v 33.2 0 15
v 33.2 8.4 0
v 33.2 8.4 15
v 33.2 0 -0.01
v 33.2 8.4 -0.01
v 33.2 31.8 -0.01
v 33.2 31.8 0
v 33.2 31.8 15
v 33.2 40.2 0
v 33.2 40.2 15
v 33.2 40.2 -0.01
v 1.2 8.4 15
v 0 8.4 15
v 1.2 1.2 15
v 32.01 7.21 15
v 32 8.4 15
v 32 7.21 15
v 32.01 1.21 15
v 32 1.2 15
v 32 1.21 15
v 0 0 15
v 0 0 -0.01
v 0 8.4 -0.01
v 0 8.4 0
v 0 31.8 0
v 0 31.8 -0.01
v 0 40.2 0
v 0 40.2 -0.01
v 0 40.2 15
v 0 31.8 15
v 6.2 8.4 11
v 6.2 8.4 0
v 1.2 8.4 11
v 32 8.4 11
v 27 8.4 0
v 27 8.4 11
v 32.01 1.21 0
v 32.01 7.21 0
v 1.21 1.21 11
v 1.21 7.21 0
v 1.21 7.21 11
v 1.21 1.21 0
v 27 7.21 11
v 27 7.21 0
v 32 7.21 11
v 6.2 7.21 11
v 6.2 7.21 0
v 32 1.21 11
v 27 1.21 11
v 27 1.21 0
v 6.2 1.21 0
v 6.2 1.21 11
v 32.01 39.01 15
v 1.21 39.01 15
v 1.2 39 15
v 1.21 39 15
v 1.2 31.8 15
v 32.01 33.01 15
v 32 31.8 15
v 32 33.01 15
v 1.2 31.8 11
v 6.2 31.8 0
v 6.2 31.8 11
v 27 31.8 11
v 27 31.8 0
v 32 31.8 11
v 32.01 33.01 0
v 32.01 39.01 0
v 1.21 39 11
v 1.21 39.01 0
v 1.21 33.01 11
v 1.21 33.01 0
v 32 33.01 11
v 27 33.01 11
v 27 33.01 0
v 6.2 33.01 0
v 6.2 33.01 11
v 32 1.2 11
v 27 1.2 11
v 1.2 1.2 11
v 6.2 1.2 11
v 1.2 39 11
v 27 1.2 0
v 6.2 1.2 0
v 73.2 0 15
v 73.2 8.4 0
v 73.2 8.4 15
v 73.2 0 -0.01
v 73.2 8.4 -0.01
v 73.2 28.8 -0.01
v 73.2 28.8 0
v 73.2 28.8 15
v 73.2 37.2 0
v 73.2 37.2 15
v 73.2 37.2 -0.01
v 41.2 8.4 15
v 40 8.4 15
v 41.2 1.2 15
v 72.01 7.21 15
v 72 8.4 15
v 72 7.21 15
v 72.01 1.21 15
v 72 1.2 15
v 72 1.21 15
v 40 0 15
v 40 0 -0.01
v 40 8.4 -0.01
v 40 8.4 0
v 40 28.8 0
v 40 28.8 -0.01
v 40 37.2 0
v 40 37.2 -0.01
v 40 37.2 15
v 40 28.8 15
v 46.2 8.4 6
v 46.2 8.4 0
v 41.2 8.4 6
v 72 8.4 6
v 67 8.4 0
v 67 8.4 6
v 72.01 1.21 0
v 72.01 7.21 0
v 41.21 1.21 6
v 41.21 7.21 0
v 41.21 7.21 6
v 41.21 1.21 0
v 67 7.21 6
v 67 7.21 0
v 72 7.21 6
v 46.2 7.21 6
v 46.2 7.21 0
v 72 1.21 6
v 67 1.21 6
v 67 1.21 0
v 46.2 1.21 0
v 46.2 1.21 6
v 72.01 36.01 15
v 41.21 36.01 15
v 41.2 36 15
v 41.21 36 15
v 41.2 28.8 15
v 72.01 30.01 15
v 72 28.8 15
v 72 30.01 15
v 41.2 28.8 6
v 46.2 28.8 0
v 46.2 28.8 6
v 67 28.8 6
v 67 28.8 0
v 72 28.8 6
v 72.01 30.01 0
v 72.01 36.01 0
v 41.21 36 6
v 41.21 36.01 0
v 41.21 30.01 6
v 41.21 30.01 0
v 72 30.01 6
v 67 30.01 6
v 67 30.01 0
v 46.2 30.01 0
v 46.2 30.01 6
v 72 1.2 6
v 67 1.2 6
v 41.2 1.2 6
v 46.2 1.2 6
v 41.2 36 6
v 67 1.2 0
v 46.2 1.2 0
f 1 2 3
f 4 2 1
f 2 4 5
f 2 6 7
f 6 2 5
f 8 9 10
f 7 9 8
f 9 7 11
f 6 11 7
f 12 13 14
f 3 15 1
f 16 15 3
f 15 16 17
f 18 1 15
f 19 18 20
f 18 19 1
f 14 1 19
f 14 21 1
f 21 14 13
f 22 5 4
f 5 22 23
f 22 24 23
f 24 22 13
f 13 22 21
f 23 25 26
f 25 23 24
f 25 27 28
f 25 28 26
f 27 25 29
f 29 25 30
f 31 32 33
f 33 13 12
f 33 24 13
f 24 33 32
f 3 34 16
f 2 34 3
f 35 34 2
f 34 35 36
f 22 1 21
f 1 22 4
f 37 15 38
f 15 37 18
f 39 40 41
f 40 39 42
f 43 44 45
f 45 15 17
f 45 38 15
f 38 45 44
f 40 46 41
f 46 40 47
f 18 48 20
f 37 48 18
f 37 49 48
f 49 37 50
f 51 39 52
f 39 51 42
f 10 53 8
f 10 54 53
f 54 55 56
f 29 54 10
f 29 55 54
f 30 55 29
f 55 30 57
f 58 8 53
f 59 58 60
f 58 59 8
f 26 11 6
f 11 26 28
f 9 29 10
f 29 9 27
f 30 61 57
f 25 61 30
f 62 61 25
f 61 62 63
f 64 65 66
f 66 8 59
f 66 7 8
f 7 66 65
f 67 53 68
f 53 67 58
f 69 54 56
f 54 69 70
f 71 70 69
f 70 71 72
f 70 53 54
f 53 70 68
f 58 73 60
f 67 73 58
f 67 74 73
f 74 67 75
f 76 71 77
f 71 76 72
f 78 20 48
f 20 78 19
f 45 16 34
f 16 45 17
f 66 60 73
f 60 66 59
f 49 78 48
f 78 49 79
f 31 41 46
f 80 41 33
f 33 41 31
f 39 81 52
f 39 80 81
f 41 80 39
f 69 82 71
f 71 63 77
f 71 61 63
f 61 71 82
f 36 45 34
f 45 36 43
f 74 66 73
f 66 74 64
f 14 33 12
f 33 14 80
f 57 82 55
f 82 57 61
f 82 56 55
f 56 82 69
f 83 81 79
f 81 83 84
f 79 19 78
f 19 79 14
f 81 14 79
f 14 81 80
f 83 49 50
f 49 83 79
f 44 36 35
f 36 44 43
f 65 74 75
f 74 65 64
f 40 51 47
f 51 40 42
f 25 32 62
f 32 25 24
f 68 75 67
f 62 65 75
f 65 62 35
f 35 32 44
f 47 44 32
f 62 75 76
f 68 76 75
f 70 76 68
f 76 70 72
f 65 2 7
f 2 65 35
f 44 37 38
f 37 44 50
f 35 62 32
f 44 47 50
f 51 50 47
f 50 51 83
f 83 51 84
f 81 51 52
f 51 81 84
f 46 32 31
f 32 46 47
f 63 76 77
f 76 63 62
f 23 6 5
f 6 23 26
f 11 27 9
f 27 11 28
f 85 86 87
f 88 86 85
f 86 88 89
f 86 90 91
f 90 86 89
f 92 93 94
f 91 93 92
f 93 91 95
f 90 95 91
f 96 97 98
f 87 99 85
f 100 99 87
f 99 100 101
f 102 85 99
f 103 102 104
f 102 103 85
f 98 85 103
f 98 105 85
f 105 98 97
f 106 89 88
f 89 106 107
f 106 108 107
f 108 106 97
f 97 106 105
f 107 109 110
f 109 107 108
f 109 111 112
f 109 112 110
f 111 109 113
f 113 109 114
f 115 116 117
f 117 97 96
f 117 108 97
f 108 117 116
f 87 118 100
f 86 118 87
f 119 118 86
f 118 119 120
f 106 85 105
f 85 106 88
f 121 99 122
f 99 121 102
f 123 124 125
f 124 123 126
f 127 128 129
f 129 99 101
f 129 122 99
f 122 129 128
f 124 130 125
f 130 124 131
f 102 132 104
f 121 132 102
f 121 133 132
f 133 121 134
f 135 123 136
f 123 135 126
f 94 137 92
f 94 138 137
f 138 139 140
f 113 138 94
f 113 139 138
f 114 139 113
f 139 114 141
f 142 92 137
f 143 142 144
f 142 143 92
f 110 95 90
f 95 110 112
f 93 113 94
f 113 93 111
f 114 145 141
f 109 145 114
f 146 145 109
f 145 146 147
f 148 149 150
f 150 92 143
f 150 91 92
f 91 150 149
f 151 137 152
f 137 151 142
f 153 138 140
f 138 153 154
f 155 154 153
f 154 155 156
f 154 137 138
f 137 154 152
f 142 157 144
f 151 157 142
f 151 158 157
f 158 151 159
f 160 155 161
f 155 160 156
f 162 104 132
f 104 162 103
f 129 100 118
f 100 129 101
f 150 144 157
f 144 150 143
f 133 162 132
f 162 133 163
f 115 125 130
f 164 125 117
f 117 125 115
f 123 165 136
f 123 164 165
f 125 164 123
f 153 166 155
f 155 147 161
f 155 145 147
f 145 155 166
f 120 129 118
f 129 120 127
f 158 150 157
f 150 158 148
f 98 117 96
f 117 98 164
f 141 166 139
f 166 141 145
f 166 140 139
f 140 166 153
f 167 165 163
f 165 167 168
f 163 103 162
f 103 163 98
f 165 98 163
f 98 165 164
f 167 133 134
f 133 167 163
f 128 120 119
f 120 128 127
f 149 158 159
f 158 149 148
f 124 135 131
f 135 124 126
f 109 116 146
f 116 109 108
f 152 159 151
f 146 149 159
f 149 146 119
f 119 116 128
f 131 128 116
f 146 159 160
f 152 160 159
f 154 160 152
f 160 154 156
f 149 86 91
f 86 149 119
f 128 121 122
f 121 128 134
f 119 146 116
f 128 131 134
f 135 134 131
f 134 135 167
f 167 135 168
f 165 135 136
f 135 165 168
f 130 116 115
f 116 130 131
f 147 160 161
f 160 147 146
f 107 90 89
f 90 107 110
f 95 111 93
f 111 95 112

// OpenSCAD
// file: ../../Base/Boxes.scad
// Fischertechnik Box Foundation
// Pre-designed Boxes

use <Constants.scad>

include <PlacementOptions.scad>

box190Width = 190;
box190Depth = 130;
box130Width = 130;
box130Depth = 95;
boxUsageHeight = 33.9;
boxWallThickness = 2.4;
boxBaseThickness = 1.0;
boxWebWidth = 3.0;

// getBoxWallThickness()
// Gets the wall thickness of a Fischertechnik Box

function getBoxWallThickness() = boxWallThickness;

// Gets the usable height of a fischertechnik box
function getBoxUsageHeight() = boxUsageHeight;

// Gets the thickness of the Fischertechnik box base.
function getBoxBaseThickness() = boxBaseThickness;

// Gets the width of a box web
function getBoxWebWidth() = boxWebWidth;

// Gets the usable inner space of a Box 190 as an x/y-list
function getBox190Space() = [
    box190Width - 2*getBoxWallThickness(), 
    box190Depth - 2*getBoxWallThickness() ];

// Imports the Fischertechnik empty box 130x190 mm and places it at position 0,0
// 190x130 are the outer sizes, the inner space is slightly smaller. Use getBox190Space() to get the inner sizes.
// This module needs the STL file "Fischertechnik Box 130x190.stl" in the library path.
// The box is positioned that the usable inner space is at the 0,0,0 position. The

module Box190() {
    translate([-getBoxWallThickness(),-getBoxWallThickness(),-getBoxBaseThickness()])
        import("Fischertechnik Box 130x190.stl", convexity=3);
}

// Gets the usable inner space of a Box 130 as an x/y-list
function getBox130Space() = [
    box130Width - 2*getBoxWallThickness(), 
    box130Depth - 2*getBoxWallThickness() ];

// Imports the Fischertechnik empty box 95x130 mm and places it at position 0,0
// 190x130 are the outer sizes, the inner space is slightly smaller. Use getBox190Space() to get the inner sizes.
// This module needs the STL file "Fischertechnik Box 95x130.stl" in the library path.
// The box is positioned that the usable inner space is at the 0,0,0 position. The

module Box130() {
    translate([-getBoxWallThickness(),-getBoxWallThickness(),-getBoxBaseThickness()])
        import("Fischertechnik Box 95x130.stl", convexity=3);
}

// Creates a web at the specified box walls
// corner 0 = LowerLeft, 1 = UpperLeft, 2 = UpperRight, 3 = LowerRight
// side 0 = LeftOfCorner, 1 = RightOfCorner
// distance = Distance in mm from the corner
// boxSpace = inner width and depth of the box (default: Box 190)
// webWidth = length of the web (default is 3 mms)
// webThickness = thickness of the web (default is 1 mm)

module BoxWeb(corner, side, distance, boxSpace=getBox190Space(), webWidth=getBoxWebWidth(), webThickness=1.0) {
    sink = getBoxWallThickness()/2;

    width = (corner % 2 == 0) ? 
            (side == LeftOfCorner ? webWidth : webThickness) :
            (side == LeftOfCorner ? webThickness : webWidth);

    depth = (corner % 2 == 0) ? 
            (side == RightOfCorner ? webWidth : webThickness) :
            (side == RightOfCorner ? webThickness : webWidth);
    
    xDiff = corner == LowerLeft ? 
                (side == LeftOfCorner ? -sink : distance) :
            (corner == UpperLeft ?                
                (side == LeftOfCorner ? distance : -sink) :
            (corner == UpperRight ?
                (side == LeftOfCorner ? boxSpace.x-webWidth+sink : boxSpace.x-distance-webThickness) :
                (side == LeftOfCorner ? boxSpace.x-distance-webThickness: boxSpace.x-webWidth+sink)));

    yDiff = corner == LowerLeft ? 
                (side == RightOfCorner ? -sink : distance) :
            (corner == UpperLeft ?
                (side == RightOfCorner ? boxSpace.y-distance : boxSpace.y-webWidth+sink) :
            (corner == UpperRight ?
                (side == RightOfCorner ? boxSpace.y-webWidth+sink : boxSpace.y-distance) :
                (side == RightOfCorner ? distance : -sink)));
    
    translate([xDiff, yDiff, -getExcess()])
        cube([width, depth, boxUsageHeight + 2*getExcess()]);
}
// file: ../../Base/Rotation.scad
// Fischertechnik Box Foundation
// Geometry Helpers Rotation

include <PlacementOptions.scad>

// getRotatedSpace(space, rotation=NoRotation)
// Rotates the space dependent on the specified rotation

function getRotatedSpace(space, rotation=NoRotation) = [
    (rotation == Rotate90 || rotation == Rotate270) ? space.y : space.x,
    (rotation == Rotate90 || rotation == Rotate270) ? space.x : space.y
];

// Rotates the given space around the fixed left lower corner
// space = the space the children needs as width/depth list [width,depth]
// rotation = 0 Rotate0 degrees, 1 Rotate90 degrees, 2 Rotate180 degrees, 3 Rotate270 degrees (equivalent to -90)

module RotateFix(space, rotation=Rotate0) {
    dy = (rotation == Rotate0 || rotation == Rotate270) ? 0 :
        (rotation == Rotate90) ? space.x :
        space.y;
    dx = (rotation < Rotate180) ? 0 :
        (rotation == Rotate180) ? space.x :
        space.y;
    
    translate([dx, dy, 0])
        rotate([0, 0, rotations[rotation]])
            children();
}
// file: ../../Base/Alignment.scad
// Fischertechnik Box Foundation
// Geometry Helpers Alignment

include <PlacementOptions.scad>

// getAlignedX(elementWidth, spaceWidth, align=AlignRight, offset=0)
// Gets the aligned X offset of an element with the given
// width in the given space.
// elementWidth = The width of the element to positon
// spaceWidth = The space where the element should be aligned
// align = 0 AlignLeft, 1 AlignCenter, 2 AlignRight
// offset = an optional offset from the aligned position. When
// aligned left or centered, then positive values are in X direction.
// When aligned right then positive values are in negative X direction.

function getAlignedX(elementWidth, spaceWidth, align=AlignRight, offset=0) =
    (align == AlignLeft) ?
        offset :
        ((align == AlignCenter) ?
        (spaceWidth - elementWidth)/2 + offset :
        spaceWidth - offset - elementWidth);

// getAlignedY(elementDepth, spaceDepth, align=AlignTop, offset=0)
// Gets the aligned Y offset of an element with the given
// depth in the given space.
// elementDepth = The depth of the element to positon
// spaceDepth = The space where the element should be aligned
// align = 0 AlignBottom, 1 AlignCenter, 2 AlignTop
// offset = an optional offset from the aligned position. When
// aligned bottom or centered, then positive values are in Y direction.
// When aligned top then positive values are in negative Y direction.

function getAlignedY(elementDepth, spaceDepth, align=AlignTop, offset=0) =
    (align == AlignBottom) ?
        offset :
        ((align == AlignCenter) ?
        (spaceDepth - elementDepth)/2 + offset :
        spaceDepth - offset - elementDepth);
// file: ../../Base/PlacementOptions.scad
// Fischertechnik Box Foundation
// Placement Options

// Alignment
NoAlign = 0;
AlignLeft = 1;
AlignBottom = 2;
AlignCenter = 3;
AlignRight = 4;
AlignTop = 5;

// Element rotation degree steps
rotations = [0, -90, -180, -270];

// Rotation
NoRotation = 0;
Rotate0 = 0;
Rotate90 = 1;
Rotate180 = 2;
Rotate270 = 3;

// Docking (seen from above)
NoDock = -1;
DockLeft = 0;
DockTop = 1;
DockRight = 2;
DockCorner = 2;
DockBottom = 3;

// Web corners
LowerLeft = 0;
UpperLeft = 1;
UpperRight = 2;
LowerRight = 3;

// Web position relative to corner
LeftOfCorner = 0;
RightOfCorner = 1;
// file: ../../Base/Placement.scad
// Fischertechnik Box Foundation
// Geometry Helpers Placement

use <Constants.scad>
use <Alignment.scad>
use <Rotation.scad>
use <Boxes.scad>

include <PlacementOptions.scad>

// Place(x=0, y=0, elementSpace=[0,0], alignX=AlignLeft, alignY=AlignBottom, rotation=Rotate0, boxSpace=getBox190Space())
// Places the child at the specified position
// y = Y-Position. This is a relative position when an X aligment is specified.
// x = X-Position. This is a relative position when an Y aligment is specified.
// elementSpace = space of the element to be placed [x,y]
// alignX = -1=NoAlign, 0 AlignLeft, 1 AlignCenter, 3 AlignRight (elementSpace and boxSpace required!)
// alignY = -1=NoAlign, 2 AlignBottom, 1 AlignCenter, 4 AlignTop (elementSpace and boxSpace required!)
// rotation = 0 Rotate0 0 degrees, 1 Rotate90 90 degrees, 
// 2 Rotate180 180 degrees, 3 Rotate270 270 degrees (equivalent to -90)
// boxSpace = Inner space of the box where the placement occurs [x,y] - default is Box 190x130 inner space

module Place(x=0, y=0, elementSpace=[0,0], 
  alignX=AlignLeft, alignY=AlignBottom, 
  rotation=NoRotation, boxSpace=getBox190Space()) {

    module Position(x, y, space, rotation=Rotate0) {
        translate([x, y, 0])
            RotateFix(space, rotation)
                children();
    }

    space = getRotatedSpace(elementSpace, rotation);
    alignedX = getAlignedX(space.x, boxSpace.x, alignX, x);
    alignedY = getAlignedY(space.y, boxSpace.y, alignY, y);
    Position(alignedX, alignedY, elementSpace, rotation)
        children();
}

// Center(space=getBox130Space(), elementSpace=[0,0])
// space = Space where the children is centered. For cylinder use centered=true and no elementSpace.
// elementSpace = space of the element to be centered [x,y]

module Center(space=getBox190Space(), elementSpace=[0,0]) {
    Place(elementSpace=elementSpace, boxSpace=space, alignX=AlignCenter, alignY=AlignCenter)
        children();
}

// CenterHorizontal(width=0, y=0, offset=0, space=getBox130Space())
// width = Width of the element to be placed.
// y = Y position of the element
// offset = Offset from the center position (negative will be left of the center)
// space = Space where the element is placed

module CenterHorizontal(width=0, y=0, offset=0, space=getBox190Space()) {
    Place(x=offset, y=y, elementSpace=[width, 0], boxSpace=space, alignX=AlignCenter)
        children(0);
}

// CenterVertical(depth=0, x=0, offset=0, space=getBox130Space())
// depth = Depth of the element to be placed.
// x = X position of the element
// offset = Offset from the center position (negative will be down of the center)
// space = Space where the element is placed

module CenterVertical(depth=0, x=0, offset=0, space=getBox190Space()) {
    Place(x=x, y=offset, elementSpace=[0, depth], boxSpace=space, alignY=AlignCenter)
        children(0);
}

// getIsVertical(align)
// True if the specified alignment needs a vertical orientation for a divider (AlignRight, AlignLeft)

function getIsVertical(align) = (align == AlignRight || align == AlignLeft);

// getIsHorizontal(align)
// True if the specified alignment needs a horizontal orientation for a divider (AlignTop, AlignBottom)

function getIsHorizontal(align) = (align == AlignTop || align == AlignBottom);
// file: ../../Base/Constants.scad
// Fischertechnik Box Foundation
// Constants

// Constant values necessary for multiple elements

// Base constants
dividerThickness = 1.2;
excess = 0.01;
fragments = 90;
tolerance = 0.8;

// Gets the thickness of a divider 
function getDividerThickness() = dividerThickness;

// Gets the excess that is used to merge walls into each other
function getExcess() = excess;

// Gets amount of fragments of a cylinder
function getFragments() = fragments;

// Gets the inner tolerance of a frame to each side
function getTolerance() = tolerance;


// Fischertechnik specific constants
axisDiameter = 4;
axisBottomDiameter = axisDiameter + 1;
standardEdgeDistance = 2.5;
standardWebDistance = 11.5;
standardCornerLength = 15;
tubeWallFactor = 0.8;
smallPartsFrameHeight = 20;

// Gets axis diameter
function getAxisDiameter() = axisDiameter;

// Gets axis bottom diameter for thicker part at the bottom
function getAxisBottomDiameter() = axisBottomDiameter;

// gets the standard distance to the wall of the box for dockable frames with webs
function getStandardEdgeDistance() = standardEdgeDistance;

// gets the standard distance of each web to the corner of the dockable frame
function getStandardWebDistance() = standardWebDistance;

// gets the standard length of the corner walls of a dockable frame
function getStandardCornerLength() = standardCornerLength;

// gets the wall thickness of a tube.
function getTubeWallThickness() = tubeWallFactor * getDividerThickness();

// gets the frame height for docked small parts boxes.
function getSmallPartsFrameHeight() = smallPartsFrameHeight;
// main file
// Fischertechnik Box Foundation
// ModelBase
// Test FrameSpecialFlat

use <../../ModelBase/Complex.scad>

FrameSpecialFlat([30, 37, 4]);

translate([40, 0])
FrameSpecialFlat([30, 34, 9]);
